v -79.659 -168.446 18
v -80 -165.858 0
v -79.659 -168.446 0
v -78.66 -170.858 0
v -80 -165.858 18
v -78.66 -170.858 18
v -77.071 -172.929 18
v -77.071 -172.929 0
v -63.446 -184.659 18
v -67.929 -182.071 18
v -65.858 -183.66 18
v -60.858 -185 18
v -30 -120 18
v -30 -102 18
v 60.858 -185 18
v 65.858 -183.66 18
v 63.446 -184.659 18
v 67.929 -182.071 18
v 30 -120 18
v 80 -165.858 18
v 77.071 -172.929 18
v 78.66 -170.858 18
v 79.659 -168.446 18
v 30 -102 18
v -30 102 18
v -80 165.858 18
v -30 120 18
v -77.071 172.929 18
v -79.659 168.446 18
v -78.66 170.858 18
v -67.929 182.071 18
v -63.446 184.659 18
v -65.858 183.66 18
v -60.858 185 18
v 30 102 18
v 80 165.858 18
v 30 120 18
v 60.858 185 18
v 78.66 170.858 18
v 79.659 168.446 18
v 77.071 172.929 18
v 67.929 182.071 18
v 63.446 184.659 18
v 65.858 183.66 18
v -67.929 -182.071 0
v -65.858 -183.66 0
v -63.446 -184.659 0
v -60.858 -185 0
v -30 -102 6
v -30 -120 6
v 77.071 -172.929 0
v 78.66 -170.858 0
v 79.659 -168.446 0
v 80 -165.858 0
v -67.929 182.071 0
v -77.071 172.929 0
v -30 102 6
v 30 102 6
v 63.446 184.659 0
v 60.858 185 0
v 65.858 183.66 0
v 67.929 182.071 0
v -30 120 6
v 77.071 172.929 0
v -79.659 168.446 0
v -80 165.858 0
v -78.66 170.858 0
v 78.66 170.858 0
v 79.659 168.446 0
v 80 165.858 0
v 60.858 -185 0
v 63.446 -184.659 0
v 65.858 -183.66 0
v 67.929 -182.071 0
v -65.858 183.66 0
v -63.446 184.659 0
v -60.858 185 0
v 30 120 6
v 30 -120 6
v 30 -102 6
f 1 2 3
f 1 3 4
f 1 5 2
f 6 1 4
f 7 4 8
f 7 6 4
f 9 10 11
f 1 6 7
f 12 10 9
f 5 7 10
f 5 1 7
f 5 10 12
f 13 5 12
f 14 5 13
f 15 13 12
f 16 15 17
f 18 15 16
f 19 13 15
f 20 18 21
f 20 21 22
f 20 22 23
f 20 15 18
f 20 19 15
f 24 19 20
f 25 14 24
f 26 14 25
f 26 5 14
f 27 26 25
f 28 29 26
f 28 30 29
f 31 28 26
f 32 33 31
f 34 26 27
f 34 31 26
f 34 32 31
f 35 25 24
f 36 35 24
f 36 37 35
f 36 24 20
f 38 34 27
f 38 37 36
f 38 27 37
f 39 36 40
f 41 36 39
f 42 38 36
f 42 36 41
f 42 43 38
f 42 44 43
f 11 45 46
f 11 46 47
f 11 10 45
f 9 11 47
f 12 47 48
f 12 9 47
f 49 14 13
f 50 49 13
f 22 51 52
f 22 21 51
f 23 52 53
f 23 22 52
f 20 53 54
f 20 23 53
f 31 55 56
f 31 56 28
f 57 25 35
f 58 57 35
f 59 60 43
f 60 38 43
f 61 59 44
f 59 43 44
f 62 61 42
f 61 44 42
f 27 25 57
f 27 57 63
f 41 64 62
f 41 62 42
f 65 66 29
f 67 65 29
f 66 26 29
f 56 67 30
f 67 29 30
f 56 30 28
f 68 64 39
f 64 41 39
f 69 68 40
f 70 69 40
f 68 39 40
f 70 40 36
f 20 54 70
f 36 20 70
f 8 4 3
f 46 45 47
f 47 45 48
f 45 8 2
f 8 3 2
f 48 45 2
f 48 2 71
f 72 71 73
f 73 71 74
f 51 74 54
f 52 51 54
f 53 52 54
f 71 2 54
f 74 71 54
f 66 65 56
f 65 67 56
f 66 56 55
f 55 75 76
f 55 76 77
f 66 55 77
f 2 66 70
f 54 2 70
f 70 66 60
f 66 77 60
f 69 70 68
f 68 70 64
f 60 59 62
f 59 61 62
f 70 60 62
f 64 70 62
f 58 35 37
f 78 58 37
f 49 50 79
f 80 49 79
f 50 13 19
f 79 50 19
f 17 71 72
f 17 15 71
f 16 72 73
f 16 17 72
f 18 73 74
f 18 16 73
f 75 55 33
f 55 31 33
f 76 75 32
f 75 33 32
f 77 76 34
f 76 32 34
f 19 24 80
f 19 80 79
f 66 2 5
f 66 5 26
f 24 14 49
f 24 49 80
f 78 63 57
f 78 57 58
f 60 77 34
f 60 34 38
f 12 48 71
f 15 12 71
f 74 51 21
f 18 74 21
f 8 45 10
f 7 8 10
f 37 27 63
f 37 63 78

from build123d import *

# Parameters (mm, degrees)
SKETCH_W     = 160
SKETCH_H     = 370
PAD_DEPTH    = 18
SKETCH001_W  = 60
SKETCH001_H  = 18
POCKET_DEPTH = 12
CHAMFER_SIZE = 15
FILLET_R     = 10


with BuildPart() as part:
    # Sketch → Pad (new body)
    with BuildSketch(Plane.XY):
        Rectangle(SKETCH_W, SKETCH_H)
    extrude(amount=PAD_DEPTH)

    # Sketch001 → Pocket (cut)
    with BuildSketch(Plane.XY.offset(18)):
        with Locations((0, 111)):
            Rectangle(SKETCH001_W, SKETCH001_H)
    pocket = extrude(amount=-POCKET_DEPTH, mode=Mode.SUBTRACT)

    # Mirrored: Pocket across Sketch001 H_Axis
    add(pocket.mirror(Plane(origin=(0, 0, 18), x_dir=(0, 0, 1), z_dir=(0, 1, 0))), mode=Mode.SUBTRACT)

    # Chamfer
    chamfer_edges = [part.edges().sort_by_distance(p)[0] for p in [
        (-80, -185, 9),
        (-80, 185, 9),
        (80, 185, 9),
        (80, -185, 9),
    ]]
    chamfer(chamfer_edges, length=CHAMFER_SIZE)

    # Fillet
    fillet_edges = [part.edges().sort_by_distance(p)[0] for p in [
        (65, -185, 9),
        (80, -170, 9),
        (-65, -185, 9),
        (-80, -170, 9),
        (-80, 170, 9),
        (-65, 185, 9),
        (65, 185, 9),
        (80, 170, 9),
    ]]
    fillet(fillet_edges, radius=FILLET_R)


solid = part.part
